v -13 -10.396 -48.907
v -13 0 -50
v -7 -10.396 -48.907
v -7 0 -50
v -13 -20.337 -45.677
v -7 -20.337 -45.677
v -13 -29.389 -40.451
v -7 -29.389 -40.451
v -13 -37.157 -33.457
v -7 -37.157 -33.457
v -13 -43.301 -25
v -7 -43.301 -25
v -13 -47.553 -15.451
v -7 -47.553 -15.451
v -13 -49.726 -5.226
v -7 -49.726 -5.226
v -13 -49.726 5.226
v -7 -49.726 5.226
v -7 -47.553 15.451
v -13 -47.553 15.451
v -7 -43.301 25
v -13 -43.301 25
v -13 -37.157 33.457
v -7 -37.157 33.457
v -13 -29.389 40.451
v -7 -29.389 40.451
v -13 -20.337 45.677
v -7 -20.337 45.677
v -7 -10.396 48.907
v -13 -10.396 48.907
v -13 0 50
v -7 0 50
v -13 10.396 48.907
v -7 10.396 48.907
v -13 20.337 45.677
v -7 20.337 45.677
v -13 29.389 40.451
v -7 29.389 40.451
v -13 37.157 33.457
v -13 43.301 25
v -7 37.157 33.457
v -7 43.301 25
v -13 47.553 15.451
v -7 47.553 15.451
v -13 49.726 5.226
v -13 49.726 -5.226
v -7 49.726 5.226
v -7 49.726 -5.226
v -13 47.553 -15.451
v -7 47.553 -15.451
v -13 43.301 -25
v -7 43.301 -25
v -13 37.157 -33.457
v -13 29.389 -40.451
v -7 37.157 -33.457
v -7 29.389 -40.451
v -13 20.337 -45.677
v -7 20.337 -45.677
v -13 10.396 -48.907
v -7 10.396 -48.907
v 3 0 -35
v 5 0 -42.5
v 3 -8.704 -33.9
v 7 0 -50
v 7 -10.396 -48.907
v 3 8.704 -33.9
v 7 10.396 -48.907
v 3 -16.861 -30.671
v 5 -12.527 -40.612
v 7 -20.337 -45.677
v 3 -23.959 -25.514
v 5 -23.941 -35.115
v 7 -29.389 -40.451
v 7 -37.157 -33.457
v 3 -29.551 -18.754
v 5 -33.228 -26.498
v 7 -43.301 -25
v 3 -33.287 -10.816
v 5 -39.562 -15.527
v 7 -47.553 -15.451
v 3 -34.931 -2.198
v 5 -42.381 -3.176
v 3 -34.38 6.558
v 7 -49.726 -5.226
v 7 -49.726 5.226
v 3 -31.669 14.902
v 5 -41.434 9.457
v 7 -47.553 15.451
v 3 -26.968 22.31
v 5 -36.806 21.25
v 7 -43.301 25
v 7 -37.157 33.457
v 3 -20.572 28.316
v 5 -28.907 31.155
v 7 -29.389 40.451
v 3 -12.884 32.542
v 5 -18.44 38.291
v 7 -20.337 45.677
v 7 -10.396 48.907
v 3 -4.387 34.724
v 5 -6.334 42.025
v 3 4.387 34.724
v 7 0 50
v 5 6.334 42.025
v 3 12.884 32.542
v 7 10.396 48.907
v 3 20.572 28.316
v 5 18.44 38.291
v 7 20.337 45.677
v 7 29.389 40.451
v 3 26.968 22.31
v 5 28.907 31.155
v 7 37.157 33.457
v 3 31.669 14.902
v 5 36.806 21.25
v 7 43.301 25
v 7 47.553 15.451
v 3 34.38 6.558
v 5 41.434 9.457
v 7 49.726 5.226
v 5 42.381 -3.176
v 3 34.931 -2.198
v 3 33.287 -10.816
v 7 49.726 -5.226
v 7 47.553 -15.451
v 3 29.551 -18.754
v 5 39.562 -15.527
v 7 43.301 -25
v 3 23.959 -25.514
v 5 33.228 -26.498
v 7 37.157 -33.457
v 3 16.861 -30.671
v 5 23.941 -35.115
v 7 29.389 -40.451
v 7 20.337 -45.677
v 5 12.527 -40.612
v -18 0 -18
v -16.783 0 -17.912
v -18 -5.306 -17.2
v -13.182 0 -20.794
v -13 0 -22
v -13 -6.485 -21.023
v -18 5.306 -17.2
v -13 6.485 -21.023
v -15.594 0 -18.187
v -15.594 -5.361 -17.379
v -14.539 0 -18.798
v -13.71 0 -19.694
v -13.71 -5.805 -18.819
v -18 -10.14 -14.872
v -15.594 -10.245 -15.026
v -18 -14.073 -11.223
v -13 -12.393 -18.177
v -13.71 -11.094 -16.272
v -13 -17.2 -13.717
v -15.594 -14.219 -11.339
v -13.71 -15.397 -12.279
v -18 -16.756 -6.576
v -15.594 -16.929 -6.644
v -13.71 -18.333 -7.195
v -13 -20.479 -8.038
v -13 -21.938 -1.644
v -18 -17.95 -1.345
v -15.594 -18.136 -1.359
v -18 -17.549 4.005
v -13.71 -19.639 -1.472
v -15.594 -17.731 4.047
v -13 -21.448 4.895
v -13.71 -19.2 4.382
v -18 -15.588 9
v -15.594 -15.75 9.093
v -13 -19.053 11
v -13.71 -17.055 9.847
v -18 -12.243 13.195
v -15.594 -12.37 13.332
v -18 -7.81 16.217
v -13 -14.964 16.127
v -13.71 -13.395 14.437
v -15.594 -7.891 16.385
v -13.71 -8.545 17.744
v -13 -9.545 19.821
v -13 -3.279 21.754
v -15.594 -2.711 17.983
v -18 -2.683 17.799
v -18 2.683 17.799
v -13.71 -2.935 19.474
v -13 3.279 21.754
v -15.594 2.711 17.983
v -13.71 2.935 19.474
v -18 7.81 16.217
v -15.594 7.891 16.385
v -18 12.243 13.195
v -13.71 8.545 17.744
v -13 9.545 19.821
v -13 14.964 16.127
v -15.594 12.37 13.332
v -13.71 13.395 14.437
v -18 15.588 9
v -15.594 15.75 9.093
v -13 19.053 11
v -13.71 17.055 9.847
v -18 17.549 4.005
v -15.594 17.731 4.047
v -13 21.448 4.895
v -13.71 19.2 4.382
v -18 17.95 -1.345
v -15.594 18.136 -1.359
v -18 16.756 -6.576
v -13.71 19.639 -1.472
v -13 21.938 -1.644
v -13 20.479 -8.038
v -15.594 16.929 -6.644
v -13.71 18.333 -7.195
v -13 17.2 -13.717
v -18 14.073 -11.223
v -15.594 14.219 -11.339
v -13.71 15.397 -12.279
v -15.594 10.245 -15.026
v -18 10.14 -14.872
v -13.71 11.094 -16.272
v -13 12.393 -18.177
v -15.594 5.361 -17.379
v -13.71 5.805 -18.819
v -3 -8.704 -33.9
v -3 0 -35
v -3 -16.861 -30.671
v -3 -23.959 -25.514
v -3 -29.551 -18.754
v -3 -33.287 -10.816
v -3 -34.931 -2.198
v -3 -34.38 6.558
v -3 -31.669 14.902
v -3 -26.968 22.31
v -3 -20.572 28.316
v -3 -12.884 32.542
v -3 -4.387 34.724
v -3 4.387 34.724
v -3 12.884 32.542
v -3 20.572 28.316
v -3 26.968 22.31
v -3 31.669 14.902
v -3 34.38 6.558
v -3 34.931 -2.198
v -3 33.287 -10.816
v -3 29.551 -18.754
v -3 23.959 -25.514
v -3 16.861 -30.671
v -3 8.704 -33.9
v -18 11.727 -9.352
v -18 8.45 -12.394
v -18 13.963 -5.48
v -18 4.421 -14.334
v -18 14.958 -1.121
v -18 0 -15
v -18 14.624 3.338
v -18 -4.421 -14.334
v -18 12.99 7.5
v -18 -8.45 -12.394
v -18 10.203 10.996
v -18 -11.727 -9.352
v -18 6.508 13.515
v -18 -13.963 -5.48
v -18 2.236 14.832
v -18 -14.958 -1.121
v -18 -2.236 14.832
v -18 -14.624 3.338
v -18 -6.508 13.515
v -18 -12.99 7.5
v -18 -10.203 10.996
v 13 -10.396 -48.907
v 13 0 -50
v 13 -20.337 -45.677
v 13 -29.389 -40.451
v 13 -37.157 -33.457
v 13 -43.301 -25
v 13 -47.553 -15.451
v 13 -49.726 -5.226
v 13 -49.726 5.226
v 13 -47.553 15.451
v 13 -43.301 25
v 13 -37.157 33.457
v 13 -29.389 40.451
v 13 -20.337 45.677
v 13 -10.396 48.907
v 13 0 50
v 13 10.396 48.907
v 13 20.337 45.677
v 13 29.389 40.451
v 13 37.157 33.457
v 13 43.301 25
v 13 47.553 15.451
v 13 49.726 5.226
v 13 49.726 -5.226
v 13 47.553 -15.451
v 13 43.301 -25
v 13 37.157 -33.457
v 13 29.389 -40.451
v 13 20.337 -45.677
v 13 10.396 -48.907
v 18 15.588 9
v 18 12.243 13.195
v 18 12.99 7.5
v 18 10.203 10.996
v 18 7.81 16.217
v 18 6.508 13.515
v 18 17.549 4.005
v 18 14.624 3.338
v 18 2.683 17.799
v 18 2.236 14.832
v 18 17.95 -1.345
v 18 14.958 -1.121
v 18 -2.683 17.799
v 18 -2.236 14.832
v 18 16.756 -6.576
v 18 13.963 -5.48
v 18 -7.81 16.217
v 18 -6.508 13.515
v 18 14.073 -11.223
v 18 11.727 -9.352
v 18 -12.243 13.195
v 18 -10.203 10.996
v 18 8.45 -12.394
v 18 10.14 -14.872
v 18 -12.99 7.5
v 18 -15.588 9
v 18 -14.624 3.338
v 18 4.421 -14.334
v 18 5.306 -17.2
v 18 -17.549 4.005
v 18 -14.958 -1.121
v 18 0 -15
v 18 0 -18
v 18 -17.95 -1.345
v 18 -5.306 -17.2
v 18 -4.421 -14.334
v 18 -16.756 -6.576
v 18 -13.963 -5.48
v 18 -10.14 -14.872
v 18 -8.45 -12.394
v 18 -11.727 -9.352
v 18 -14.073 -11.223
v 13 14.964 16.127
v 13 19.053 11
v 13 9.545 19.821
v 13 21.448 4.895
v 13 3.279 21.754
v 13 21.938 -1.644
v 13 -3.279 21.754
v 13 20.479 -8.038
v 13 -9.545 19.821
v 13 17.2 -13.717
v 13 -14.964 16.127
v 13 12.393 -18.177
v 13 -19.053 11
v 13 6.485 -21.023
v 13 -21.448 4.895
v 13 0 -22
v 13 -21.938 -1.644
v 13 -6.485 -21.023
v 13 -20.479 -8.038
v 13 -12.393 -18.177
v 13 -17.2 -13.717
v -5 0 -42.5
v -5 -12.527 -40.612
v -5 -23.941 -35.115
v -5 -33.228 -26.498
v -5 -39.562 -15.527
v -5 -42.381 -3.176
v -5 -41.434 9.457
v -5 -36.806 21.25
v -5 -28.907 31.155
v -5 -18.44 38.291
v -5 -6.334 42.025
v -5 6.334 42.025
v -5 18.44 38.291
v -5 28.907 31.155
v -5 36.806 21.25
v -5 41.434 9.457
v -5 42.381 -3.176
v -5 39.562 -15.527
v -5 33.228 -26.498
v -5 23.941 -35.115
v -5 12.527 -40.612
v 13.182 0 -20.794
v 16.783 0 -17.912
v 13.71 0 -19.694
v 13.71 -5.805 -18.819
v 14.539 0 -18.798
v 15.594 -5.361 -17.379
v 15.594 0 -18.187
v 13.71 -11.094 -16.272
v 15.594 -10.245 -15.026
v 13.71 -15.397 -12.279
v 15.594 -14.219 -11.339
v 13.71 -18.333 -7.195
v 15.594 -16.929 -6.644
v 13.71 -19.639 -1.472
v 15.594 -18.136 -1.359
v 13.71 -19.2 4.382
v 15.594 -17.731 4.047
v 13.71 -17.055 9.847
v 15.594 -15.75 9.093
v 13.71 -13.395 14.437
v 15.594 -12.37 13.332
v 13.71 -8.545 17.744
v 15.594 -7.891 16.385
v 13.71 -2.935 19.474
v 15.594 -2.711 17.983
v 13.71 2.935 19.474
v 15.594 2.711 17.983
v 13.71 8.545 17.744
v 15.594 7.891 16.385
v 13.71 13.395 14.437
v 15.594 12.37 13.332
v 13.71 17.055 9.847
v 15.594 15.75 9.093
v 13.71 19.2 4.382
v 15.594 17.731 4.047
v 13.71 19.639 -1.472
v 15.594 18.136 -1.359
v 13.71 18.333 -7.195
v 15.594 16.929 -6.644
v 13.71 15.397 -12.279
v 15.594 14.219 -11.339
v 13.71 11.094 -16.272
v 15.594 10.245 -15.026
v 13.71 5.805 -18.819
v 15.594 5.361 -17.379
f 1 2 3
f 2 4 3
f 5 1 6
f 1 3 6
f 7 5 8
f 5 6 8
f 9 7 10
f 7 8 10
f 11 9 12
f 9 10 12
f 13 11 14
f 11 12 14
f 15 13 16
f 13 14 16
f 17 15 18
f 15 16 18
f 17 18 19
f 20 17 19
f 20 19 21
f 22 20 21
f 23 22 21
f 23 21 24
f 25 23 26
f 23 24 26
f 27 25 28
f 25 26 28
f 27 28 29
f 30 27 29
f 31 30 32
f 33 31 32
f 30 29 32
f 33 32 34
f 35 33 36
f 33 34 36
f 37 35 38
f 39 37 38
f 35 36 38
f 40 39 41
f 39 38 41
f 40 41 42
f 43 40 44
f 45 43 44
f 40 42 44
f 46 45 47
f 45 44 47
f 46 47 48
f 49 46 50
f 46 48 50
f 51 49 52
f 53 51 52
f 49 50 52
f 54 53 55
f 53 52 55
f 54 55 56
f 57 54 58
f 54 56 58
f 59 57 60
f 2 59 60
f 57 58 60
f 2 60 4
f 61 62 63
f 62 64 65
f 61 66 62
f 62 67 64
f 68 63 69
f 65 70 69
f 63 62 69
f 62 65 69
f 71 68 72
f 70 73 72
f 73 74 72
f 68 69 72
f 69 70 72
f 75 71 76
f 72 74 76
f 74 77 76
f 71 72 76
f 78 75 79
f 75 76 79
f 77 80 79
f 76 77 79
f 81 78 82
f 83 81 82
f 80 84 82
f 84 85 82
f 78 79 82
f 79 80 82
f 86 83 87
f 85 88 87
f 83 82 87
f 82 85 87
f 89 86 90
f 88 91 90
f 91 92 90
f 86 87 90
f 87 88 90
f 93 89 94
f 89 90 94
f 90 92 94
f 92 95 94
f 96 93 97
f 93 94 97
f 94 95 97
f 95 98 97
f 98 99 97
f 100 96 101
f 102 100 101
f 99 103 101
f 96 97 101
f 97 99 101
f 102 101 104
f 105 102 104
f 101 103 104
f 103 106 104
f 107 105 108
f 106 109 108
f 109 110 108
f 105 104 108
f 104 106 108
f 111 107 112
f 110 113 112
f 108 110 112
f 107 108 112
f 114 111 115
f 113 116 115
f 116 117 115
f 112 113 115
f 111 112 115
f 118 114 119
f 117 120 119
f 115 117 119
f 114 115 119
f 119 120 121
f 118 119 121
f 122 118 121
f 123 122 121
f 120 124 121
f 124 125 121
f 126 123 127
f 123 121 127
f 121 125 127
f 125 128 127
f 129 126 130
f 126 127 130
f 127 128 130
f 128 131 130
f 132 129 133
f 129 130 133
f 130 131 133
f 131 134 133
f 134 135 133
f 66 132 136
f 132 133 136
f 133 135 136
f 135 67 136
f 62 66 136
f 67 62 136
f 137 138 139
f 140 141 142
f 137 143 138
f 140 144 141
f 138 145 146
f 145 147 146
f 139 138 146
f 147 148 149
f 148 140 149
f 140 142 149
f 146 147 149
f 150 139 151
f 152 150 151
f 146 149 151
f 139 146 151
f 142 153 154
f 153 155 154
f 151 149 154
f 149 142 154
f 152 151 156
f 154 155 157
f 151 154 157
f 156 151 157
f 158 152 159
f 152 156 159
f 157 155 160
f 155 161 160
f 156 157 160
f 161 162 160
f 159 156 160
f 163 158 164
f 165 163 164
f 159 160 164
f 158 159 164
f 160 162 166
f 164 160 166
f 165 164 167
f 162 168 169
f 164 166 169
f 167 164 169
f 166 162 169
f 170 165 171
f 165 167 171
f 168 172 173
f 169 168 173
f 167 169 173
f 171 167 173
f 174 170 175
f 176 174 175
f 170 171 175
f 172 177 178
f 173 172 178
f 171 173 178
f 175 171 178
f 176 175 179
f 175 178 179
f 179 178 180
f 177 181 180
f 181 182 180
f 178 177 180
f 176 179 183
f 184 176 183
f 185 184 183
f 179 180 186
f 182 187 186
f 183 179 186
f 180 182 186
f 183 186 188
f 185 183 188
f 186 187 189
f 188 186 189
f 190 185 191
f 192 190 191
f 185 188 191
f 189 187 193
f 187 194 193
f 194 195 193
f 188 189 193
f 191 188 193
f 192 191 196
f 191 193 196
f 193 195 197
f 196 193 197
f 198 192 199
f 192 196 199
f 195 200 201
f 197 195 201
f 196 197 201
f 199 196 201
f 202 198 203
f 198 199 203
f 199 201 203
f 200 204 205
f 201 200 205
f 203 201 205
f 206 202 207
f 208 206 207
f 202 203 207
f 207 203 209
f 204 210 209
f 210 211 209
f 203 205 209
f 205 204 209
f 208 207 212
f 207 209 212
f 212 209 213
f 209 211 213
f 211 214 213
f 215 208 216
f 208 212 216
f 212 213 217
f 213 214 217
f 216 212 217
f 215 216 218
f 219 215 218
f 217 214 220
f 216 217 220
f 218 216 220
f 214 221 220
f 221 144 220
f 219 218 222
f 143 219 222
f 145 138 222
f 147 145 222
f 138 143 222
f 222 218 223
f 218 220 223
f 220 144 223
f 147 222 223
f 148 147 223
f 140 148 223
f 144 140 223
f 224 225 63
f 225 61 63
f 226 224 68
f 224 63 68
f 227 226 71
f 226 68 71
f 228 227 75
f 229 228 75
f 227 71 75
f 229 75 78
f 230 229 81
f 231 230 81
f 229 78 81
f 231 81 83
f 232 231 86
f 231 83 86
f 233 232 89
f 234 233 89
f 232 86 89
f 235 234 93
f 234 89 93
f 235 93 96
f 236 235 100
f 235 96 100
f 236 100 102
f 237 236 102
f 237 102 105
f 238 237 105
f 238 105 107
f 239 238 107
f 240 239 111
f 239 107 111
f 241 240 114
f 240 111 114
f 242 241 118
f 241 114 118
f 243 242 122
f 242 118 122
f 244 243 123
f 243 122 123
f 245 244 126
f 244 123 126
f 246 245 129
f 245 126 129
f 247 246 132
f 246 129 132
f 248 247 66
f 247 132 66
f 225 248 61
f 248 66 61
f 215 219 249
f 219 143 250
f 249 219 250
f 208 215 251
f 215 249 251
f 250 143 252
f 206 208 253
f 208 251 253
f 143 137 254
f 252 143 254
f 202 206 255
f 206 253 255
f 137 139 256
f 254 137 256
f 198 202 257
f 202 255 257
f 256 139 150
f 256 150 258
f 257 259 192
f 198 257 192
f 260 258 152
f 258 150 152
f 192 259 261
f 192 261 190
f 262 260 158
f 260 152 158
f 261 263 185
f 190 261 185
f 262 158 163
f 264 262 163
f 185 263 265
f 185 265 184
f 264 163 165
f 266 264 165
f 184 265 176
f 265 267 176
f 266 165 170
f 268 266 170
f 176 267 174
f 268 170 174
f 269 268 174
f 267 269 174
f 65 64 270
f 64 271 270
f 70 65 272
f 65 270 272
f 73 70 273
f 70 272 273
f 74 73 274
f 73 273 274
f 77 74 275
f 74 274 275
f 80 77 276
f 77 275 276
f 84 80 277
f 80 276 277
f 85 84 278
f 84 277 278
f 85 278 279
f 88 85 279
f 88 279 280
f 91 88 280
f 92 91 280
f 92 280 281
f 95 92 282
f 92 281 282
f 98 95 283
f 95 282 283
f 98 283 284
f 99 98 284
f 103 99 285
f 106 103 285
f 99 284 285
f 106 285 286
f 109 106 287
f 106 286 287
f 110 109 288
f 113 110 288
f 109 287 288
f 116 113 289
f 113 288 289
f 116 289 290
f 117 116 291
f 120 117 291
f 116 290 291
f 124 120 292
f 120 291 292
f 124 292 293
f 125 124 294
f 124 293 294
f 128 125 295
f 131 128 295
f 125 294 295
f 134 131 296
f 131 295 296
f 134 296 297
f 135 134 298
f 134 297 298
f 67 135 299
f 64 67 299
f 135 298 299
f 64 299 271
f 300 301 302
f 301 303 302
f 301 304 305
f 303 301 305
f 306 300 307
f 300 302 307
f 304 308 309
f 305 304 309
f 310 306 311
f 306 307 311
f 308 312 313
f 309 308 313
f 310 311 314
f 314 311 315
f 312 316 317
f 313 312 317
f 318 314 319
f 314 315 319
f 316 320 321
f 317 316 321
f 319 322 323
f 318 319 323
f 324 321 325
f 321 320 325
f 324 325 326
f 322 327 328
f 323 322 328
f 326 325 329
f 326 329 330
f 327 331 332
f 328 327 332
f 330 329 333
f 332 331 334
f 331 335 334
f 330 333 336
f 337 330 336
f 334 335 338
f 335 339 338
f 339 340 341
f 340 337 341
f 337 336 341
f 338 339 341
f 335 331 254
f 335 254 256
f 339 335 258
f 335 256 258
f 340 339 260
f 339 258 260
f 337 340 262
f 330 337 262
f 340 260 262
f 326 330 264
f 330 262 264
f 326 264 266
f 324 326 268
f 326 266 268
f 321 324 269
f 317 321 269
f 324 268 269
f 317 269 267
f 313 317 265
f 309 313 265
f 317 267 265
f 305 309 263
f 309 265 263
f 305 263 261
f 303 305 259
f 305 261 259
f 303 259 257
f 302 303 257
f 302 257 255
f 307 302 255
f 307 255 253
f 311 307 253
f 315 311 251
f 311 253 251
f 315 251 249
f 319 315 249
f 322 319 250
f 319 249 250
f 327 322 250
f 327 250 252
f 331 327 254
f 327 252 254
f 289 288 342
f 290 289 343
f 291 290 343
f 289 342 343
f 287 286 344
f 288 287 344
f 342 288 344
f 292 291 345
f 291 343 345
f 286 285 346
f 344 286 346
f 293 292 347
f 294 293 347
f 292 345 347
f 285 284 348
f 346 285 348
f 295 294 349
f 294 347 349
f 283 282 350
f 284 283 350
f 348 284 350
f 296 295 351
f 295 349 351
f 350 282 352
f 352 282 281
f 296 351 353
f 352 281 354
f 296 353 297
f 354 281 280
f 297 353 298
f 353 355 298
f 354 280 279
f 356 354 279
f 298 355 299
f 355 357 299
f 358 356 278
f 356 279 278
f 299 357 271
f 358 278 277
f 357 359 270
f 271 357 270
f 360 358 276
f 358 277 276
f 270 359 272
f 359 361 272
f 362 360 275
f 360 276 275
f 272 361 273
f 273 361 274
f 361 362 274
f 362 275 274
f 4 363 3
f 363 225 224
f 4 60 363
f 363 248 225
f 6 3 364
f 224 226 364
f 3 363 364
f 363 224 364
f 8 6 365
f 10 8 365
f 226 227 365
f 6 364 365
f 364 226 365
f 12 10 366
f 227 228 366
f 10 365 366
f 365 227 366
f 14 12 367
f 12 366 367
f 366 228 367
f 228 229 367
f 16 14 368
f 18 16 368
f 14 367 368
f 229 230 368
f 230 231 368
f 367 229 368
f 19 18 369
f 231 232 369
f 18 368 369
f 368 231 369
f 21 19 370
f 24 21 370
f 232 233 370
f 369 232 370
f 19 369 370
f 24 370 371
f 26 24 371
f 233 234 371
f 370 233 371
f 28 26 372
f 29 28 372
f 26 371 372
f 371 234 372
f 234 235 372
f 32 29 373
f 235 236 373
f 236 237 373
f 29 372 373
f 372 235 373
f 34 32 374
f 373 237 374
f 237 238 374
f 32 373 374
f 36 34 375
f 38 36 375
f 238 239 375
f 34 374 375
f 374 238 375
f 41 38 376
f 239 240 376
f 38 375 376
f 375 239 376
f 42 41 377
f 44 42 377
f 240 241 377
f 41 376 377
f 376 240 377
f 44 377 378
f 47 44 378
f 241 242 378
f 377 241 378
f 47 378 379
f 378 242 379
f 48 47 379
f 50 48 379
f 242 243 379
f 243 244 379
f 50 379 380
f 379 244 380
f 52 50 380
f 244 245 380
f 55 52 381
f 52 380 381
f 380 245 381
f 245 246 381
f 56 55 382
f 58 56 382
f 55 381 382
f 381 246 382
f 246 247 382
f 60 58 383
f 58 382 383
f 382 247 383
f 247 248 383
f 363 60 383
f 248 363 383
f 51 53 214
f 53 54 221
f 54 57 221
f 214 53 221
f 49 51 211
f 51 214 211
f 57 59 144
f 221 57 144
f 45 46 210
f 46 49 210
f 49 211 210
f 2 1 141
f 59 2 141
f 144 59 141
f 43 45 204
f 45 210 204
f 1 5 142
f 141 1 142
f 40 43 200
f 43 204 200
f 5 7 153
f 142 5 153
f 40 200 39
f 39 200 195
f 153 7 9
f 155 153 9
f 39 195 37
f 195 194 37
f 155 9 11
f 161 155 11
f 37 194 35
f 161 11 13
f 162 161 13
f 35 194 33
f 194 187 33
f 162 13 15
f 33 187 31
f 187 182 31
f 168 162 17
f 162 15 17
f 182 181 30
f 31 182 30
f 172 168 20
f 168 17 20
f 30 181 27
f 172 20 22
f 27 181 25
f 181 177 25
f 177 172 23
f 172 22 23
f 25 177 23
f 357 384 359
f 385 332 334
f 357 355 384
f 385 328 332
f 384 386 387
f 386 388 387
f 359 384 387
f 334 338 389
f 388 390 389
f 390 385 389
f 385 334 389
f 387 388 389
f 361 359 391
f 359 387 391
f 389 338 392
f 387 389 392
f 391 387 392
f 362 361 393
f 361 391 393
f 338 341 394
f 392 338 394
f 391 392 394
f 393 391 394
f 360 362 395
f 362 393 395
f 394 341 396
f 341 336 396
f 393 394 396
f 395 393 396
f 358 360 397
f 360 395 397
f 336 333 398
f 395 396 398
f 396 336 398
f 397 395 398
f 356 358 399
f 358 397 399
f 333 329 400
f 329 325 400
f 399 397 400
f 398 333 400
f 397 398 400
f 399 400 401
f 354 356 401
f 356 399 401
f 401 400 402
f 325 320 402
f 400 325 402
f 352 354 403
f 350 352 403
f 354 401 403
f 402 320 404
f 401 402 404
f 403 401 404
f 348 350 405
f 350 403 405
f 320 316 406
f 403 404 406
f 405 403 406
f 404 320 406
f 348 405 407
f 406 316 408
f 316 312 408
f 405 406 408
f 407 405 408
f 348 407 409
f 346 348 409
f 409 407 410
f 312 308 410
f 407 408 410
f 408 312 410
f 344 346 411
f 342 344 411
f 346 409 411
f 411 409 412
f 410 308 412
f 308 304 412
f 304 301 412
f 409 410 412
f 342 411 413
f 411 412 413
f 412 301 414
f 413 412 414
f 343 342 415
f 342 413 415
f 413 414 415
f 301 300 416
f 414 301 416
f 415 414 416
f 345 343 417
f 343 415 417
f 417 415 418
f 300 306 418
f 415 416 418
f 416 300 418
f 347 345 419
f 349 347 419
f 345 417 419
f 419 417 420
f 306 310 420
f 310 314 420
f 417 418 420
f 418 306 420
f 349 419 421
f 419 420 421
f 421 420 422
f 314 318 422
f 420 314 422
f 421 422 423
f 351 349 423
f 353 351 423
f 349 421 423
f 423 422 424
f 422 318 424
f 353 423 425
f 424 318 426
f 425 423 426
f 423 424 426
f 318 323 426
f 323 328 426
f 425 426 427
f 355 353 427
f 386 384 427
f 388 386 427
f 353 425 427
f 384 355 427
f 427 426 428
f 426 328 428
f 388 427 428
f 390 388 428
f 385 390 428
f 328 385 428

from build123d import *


with BuildPart() as part:
    # Sketch1 → Revolve1 (revolve)
    with BuildSketch(Plane.XY, mode=Mode.PRIVATE) as revolve1_sk:
        with BuildLine():
            Line((18, 15), (-18, 15))
            Line((-18, 15), (-18, 18))
            ThreePointArc((-18, 18), (-14.538750305, 18.798437881), (-13, 22))
            Line((-13, 22), (-13, 50))
            Line((-13, 50), (-7, 50))
            Line((-7, 50), (-3, 35))
            Line((-3, 35), (3, 35))
            Line((3, 35), (7, 50))
            Line((7, 50), (13, 50))
            Line((13, 50), (13, 22))
            ThreePointArc((13, 22), (14.538750305, 18.798437881), (18, 18))
            Line((18, 18), (18, 15))
        make_face()
    revolve(revolve1_sk.sketch.rotate(Axis((38.229944377, 0, 0), (-1, 0, 0)), 90), axis=Axis((38.229944377, 0, 0), (-1, 0, 0)))


solid = part.part
